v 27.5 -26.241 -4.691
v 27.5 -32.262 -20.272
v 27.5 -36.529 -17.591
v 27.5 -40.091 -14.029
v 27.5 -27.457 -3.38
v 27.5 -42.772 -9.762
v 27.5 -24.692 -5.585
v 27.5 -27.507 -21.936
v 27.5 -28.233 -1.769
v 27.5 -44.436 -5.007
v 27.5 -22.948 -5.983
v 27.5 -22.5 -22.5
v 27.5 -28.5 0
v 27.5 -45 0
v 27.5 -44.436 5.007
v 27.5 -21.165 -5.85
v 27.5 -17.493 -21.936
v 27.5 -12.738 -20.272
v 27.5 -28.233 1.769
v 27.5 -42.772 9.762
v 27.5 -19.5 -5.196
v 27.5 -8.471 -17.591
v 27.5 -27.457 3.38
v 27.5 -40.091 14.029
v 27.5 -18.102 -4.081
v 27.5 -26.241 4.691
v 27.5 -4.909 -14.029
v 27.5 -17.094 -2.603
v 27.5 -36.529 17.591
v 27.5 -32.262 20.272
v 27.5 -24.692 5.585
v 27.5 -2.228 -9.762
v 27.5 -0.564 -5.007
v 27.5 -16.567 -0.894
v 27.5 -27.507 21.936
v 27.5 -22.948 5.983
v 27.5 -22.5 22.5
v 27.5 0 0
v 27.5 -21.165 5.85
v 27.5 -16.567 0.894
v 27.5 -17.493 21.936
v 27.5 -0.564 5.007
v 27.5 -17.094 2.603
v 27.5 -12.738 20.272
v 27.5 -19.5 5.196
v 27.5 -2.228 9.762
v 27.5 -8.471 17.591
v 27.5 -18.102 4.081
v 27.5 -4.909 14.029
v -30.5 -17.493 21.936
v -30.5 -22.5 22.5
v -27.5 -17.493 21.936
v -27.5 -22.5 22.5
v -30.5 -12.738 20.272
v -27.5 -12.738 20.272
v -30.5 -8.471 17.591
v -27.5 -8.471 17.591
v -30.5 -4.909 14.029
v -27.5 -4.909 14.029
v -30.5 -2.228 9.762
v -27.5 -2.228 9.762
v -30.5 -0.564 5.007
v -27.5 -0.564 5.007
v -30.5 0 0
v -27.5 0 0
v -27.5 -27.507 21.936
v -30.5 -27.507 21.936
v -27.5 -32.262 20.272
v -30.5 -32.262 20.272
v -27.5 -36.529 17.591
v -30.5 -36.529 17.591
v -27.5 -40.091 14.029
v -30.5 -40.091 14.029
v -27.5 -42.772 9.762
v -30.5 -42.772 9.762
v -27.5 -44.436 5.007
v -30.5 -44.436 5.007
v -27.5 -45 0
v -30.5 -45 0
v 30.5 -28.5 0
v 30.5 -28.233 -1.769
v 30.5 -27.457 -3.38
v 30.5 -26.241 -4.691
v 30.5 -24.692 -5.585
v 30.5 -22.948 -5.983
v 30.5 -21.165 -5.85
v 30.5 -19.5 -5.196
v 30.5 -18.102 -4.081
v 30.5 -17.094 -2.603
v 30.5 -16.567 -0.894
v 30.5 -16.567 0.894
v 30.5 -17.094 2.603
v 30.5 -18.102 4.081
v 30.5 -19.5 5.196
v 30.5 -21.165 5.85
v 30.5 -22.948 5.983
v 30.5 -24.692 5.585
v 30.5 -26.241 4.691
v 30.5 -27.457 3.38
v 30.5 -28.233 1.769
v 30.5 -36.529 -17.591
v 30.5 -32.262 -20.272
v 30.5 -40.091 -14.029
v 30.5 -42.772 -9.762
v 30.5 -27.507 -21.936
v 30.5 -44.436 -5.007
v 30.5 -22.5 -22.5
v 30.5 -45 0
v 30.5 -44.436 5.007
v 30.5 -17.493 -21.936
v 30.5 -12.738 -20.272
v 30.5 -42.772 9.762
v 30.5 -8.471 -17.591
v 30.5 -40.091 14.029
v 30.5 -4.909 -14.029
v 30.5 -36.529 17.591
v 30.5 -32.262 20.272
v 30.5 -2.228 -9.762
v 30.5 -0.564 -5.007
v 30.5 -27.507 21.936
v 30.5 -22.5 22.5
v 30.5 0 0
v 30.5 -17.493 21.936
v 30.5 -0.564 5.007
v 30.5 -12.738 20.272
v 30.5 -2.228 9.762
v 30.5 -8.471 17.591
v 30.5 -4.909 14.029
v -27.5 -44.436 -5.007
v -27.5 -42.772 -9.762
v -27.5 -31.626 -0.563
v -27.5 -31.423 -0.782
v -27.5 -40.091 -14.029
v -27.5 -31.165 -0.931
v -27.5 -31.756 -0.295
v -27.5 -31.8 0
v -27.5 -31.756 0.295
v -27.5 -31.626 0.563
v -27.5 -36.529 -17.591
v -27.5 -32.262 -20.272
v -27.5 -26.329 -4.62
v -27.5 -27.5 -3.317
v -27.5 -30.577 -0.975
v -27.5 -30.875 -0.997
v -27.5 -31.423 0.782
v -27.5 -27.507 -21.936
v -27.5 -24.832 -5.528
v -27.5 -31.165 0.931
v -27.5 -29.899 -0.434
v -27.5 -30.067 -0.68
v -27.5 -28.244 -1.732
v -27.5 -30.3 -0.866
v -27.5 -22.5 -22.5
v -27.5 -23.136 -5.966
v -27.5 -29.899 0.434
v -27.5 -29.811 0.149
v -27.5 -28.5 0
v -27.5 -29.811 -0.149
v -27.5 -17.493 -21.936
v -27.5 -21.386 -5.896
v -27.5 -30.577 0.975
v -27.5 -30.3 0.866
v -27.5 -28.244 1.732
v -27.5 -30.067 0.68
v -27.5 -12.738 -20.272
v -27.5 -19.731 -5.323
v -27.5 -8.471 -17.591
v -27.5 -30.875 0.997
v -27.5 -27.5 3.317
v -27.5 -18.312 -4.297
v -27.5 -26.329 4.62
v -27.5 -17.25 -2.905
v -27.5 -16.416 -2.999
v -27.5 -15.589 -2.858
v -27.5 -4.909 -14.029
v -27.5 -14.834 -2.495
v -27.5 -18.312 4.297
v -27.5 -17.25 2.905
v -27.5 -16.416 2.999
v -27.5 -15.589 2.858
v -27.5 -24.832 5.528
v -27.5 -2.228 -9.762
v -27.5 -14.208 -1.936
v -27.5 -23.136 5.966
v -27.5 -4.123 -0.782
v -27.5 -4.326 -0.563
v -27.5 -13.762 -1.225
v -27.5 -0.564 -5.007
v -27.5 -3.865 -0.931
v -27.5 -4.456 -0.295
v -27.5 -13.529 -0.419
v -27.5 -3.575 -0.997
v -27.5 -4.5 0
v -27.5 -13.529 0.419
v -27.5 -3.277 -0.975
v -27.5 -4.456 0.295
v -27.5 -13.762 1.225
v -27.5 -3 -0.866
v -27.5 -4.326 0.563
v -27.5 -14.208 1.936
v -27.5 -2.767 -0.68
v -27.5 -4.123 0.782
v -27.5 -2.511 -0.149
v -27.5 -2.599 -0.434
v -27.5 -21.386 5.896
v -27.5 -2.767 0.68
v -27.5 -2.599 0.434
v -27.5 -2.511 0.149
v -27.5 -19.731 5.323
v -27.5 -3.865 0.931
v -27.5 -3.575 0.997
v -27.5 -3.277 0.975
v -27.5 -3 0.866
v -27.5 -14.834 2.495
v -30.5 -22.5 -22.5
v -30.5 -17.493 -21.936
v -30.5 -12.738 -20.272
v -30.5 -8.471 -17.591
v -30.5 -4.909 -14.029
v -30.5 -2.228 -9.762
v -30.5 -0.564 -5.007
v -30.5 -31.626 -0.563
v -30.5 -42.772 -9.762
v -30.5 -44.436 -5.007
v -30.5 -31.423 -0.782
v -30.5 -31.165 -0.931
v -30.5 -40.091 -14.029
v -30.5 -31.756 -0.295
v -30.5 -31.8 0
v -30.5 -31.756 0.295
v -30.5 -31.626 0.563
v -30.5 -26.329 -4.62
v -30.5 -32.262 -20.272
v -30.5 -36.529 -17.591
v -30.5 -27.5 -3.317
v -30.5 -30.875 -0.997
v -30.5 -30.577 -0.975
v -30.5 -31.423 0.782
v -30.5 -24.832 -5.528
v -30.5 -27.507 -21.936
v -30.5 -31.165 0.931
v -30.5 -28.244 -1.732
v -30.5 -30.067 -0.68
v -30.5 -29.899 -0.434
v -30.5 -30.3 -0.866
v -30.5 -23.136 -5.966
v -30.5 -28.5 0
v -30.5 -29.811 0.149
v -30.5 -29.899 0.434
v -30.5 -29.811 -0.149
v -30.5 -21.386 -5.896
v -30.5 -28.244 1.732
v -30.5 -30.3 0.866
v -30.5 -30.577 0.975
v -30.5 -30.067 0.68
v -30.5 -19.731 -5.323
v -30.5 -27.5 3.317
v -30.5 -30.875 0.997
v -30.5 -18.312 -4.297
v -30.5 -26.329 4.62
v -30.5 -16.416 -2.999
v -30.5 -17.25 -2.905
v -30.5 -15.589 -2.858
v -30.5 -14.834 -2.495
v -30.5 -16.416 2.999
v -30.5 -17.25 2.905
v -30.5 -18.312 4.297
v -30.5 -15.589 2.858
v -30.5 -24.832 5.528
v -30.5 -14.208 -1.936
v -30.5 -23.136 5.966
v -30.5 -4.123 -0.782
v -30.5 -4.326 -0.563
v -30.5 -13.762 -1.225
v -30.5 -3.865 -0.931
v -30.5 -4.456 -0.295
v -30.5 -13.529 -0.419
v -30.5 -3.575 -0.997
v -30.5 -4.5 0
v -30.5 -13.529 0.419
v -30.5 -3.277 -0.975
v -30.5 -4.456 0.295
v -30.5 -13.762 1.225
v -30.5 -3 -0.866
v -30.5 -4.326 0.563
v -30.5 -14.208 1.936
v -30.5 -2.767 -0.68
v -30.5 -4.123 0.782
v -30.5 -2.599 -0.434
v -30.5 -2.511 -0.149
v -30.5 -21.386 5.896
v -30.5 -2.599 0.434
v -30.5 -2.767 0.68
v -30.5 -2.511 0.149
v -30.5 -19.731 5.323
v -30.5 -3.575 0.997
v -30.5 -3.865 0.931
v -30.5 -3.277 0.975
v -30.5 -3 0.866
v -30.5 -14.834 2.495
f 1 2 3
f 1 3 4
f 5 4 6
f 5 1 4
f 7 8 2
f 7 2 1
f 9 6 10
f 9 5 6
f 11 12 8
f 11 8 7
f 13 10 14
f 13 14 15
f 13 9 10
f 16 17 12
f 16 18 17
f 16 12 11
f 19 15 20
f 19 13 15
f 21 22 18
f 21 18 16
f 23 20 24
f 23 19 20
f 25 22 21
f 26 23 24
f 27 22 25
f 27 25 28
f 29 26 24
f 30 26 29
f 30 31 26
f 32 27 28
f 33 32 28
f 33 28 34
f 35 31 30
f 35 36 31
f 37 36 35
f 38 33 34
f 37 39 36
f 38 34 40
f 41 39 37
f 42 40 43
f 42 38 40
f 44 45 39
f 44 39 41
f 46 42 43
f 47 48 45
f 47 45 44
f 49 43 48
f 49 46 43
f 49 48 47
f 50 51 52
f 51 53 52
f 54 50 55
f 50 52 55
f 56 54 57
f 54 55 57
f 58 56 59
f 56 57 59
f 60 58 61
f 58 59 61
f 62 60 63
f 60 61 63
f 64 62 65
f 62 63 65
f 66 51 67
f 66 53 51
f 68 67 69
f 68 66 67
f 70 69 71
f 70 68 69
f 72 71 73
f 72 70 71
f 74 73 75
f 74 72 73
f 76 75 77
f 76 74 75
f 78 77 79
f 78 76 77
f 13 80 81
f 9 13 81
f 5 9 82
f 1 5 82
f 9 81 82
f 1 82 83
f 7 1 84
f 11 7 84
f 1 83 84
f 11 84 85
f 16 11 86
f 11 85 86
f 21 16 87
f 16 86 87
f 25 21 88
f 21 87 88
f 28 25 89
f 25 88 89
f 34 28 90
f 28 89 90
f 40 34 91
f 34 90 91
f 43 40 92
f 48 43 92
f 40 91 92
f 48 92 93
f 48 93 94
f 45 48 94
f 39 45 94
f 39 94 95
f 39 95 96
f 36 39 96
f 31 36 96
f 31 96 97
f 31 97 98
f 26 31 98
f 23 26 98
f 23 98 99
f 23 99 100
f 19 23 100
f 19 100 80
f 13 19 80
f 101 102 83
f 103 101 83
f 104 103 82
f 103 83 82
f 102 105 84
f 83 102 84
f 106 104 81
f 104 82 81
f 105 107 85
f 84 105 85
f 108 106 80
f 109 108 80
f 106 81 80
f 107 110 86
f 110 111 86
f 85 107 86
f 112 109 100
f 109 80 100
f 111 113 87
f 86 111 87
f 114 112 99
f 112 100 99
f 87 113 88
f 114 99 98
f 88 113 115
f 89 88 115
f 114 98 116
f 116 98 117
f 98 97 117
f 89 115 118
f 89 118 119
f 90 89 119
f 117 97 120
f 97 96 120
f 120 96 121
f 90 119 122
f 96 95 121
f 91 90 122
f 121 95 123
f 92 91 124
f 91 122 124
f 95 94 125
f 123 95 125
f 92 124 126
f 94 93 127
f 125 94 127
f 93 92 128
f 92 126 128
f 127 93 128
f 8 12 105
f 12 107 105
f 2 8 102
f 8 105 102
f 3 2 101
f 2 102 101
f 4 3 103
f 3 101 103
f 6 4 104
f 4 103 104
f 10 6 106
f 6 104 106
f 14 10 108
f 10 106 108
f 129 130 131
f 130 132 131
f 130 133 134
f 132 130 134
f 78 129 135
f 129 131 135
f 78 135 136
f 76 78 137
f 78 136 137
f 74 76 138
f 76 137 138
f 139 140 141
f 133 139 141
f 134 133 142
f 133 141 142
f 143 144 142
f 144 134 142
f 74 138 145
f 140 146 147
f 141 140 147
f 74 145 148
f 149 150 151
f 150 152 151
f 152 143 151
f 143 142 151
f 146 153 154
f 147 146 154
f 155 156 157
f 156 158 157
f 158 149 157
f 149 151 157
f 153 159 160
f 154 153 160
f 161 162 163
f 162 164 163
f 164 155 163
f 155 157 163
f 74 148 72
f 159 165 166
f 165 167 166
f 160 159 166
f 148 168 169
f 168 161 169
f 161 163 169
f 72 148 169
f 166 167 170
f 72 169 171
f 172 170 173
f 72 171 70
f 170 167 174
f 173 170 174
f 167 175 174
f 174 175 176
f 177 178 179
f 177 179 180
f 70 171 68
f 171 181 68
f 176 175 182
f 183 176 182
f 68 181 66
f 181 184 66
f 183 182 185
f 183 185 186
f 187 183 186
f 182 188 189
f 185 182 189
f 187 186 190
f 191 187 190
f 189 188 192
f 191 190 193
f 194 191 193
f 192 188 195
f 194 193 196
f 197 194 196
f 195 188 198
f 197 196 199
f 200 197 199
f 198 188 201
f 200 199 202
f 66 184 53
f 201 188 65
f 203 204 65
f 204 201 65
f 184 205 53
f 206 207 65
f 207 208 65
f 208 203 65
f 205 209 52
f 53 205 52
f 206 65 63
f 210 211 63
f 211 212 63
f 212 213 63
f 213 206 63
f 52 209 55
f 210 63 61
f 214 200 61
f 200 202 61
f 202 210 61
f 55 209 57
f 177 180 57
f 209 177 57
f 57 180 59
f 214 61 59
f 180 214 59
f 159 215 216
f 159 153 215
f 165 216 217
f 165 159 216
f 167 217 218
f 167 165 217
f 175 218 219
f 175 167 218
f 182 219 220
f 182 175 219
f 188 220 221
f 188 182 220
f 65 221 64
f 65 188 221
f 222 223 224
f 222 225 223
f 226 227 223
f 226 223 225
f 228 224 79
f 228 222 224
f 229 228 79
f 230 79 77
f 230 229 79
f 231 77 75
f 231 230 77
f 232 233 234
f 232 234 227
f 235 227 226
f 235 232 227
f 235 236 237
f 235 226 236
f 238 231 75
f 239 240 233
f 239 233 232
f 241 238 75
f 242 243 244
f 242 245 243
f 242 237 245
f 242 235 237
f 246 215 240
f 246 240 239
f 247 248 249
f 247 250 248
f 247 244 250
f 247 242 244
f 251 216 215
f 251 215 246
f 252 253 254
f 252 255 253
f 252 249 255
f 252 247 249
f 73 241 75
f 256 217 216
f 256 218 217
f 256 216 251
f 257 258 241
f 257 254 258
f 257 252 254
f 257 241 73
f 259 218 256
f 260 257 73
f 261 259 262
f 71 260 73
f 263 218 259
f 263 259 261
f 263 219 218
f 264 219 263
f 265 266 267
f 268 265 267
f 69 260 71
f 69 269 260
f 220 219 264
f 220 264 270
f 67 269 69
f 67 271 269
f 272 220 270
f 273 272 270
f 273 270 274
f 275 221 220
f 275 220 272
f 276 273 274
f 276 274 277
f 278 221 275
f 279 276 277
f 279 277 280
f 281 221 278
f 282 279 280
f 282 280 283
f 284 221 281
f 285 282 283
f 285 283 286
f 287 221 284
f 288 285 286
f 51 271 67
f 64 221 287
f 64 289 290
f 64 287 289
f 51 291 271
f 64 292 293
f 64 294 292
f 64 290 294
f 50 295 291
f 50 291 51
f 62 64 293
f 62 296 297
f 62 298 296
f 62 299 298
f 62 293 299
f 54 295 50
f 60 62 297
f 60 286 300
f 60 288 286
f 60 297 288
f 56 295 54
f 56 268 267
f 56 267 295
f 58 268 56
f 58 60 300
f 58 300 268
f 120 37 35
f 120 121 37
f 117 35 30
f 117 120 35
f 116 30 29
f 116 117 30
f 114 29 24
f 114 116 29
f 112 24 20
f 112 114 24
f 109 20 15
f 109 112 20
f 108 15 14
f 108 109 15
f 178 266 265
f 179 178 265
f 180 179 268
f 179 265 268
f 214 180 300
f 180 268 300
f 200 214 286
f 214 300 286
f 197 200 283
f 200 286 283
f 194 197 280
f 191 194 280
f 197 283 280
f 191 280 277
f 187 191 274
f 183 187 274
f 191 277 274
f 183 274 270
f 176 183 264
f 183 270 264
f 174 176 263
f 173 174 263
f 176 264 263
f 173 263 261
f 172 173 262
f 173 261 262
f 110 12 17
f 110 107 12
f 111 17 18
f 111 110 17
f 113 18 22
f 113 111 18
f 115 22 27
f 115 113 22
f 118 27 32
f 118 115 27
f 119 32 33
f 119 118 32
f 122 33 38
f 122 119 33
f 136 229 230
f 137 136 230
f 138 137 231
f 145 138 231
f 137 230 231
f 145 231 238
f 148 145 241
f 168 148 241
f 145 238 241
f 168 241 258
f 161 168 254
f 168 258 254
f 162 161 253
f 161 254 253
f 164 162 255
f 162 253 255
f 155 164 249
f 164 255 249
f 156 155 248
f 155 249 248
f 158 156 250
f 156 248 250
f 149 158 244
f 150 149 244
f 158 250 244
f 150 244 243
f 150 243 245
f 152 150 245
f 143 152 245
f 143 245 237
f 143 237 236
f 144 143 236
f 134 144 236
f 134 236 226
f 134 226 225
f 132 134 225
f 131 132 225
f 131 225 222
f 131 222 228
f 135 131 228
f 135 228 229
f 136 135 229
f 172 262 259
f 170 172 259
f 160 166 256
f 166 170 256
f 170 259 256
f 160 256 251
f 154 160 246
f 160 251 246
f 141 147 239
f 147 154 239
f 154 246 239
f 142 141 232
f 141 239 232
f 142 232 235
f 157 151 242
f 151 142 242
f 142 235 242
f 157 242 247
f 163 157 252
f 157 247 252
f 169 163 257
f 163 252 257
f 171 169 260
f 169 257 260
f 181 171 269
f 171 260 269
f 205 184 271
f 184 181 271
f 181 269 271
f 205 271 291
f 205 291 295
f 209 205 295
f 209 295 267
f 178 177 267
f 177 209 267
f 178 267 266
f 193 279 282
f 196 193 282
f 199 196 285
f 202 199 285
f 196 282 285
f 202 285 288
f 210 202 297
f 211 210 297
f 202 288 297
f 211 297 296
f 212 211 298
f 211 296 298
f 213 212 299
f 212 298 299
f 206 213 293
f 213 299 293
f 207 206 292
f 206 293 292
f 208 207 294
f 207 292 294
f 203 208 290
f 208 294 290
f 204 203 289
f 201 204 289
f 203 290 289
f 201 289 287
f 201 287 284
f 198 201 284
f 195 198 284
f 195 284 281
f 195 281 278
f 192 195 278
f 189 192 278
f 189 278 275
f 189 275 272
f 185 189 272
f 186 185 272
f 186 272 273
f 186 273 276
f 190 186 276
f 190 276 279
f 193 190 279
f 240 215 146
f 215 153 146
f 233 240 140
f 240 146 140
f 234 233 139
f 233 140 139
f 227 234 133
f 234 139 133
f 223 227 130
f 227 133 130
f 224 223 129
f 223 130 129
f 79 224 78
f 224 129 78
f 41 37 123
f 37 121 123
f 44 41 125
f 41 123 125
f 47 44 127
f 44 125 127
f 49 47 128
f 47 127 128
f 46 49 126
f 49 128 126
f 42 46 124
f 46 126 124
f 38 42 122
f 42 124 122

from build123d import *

# Parameters (mm, degrees)
F1_W     = 3
F1_H     = 45
F2_DEPTH = 45
F3_R     = 22.49999
F4_R     = 22.49999
F6_D     = 12
F7_D     = 12
F8_D     = 6
F9_D     = 2


# Not quite as in the source:
# - a fillet or chamfer is up to 0.001 mm smaller than in the source, because OpenCascade refuses the exact size


with BuildPart() as f2:
    # F1 (on Front) → F2 (new body)
    with BuildSketch(Plane.XZ):
        with Locations((-29, 0)):
            Rectangle(F1_W, F1_H)
    extrude(amount=F2_DEPTH)

    # F3 (radius 22.5 in the source; OpenCascade refuses exactly that, so slightly less here)
    f3_edges = [f2.edges().sort_by_distance(p)[0] for p in [
        (-29, -45, 22.5),
        (-29, -45, -22.5),
        (-29, 0, -22.5),
        (-29, 0, 22.5),
    ]]
    fillet(f3_edges, radius=F3_R)

    # F7 (through all)
    with Locations(Plane.YZ):
        with Locations((-22.5, 0)):
            Hole(F7_D / 2)

    # F8 (through all)
    with Locations(Plane.YZ):
        with Locations((-16.5, 0)):
            Hole(F8_D / 2)

    # F9 (through all)
    with Locations(Plane.YZ):
        with Locations((-3.5, 0), (-30.8, 0)):
            Hole(F9_D / 2)


with BuildPart() as f2b:
    # F1 (on Front) → F2, piece 2 (new body)
    with BuildSketch(Plane.XZ):
        with Locations((29, 0)):
            Rectangle(F1_W, F1_H)
    extrude(amount=F2_DEPTH)

    # F4 (radius 22.5 in the source; OpenCascade refuses exactly that, so slightly less here)
    f4_edges = [f2b.edges().sort_by_distance(p)[0] for p in [
        (29, -45, -22.5),
        (29, 0, -22.5),
        (29, 0, 22.5),
        (29, -45, 22.5),
    ]]
    fillet(f4_edges, radius=F4_R)

    # F6 (through all)
    with Locations(Plane(origin=(0, 0, 0), x_dir=(0, 1, 0), z_dir=(-1, 0, 0))):
        with Locations((-22.5, 0)):
            Hole(F6_D / 2)


solid = Compound([f2.part, f2b.part])
